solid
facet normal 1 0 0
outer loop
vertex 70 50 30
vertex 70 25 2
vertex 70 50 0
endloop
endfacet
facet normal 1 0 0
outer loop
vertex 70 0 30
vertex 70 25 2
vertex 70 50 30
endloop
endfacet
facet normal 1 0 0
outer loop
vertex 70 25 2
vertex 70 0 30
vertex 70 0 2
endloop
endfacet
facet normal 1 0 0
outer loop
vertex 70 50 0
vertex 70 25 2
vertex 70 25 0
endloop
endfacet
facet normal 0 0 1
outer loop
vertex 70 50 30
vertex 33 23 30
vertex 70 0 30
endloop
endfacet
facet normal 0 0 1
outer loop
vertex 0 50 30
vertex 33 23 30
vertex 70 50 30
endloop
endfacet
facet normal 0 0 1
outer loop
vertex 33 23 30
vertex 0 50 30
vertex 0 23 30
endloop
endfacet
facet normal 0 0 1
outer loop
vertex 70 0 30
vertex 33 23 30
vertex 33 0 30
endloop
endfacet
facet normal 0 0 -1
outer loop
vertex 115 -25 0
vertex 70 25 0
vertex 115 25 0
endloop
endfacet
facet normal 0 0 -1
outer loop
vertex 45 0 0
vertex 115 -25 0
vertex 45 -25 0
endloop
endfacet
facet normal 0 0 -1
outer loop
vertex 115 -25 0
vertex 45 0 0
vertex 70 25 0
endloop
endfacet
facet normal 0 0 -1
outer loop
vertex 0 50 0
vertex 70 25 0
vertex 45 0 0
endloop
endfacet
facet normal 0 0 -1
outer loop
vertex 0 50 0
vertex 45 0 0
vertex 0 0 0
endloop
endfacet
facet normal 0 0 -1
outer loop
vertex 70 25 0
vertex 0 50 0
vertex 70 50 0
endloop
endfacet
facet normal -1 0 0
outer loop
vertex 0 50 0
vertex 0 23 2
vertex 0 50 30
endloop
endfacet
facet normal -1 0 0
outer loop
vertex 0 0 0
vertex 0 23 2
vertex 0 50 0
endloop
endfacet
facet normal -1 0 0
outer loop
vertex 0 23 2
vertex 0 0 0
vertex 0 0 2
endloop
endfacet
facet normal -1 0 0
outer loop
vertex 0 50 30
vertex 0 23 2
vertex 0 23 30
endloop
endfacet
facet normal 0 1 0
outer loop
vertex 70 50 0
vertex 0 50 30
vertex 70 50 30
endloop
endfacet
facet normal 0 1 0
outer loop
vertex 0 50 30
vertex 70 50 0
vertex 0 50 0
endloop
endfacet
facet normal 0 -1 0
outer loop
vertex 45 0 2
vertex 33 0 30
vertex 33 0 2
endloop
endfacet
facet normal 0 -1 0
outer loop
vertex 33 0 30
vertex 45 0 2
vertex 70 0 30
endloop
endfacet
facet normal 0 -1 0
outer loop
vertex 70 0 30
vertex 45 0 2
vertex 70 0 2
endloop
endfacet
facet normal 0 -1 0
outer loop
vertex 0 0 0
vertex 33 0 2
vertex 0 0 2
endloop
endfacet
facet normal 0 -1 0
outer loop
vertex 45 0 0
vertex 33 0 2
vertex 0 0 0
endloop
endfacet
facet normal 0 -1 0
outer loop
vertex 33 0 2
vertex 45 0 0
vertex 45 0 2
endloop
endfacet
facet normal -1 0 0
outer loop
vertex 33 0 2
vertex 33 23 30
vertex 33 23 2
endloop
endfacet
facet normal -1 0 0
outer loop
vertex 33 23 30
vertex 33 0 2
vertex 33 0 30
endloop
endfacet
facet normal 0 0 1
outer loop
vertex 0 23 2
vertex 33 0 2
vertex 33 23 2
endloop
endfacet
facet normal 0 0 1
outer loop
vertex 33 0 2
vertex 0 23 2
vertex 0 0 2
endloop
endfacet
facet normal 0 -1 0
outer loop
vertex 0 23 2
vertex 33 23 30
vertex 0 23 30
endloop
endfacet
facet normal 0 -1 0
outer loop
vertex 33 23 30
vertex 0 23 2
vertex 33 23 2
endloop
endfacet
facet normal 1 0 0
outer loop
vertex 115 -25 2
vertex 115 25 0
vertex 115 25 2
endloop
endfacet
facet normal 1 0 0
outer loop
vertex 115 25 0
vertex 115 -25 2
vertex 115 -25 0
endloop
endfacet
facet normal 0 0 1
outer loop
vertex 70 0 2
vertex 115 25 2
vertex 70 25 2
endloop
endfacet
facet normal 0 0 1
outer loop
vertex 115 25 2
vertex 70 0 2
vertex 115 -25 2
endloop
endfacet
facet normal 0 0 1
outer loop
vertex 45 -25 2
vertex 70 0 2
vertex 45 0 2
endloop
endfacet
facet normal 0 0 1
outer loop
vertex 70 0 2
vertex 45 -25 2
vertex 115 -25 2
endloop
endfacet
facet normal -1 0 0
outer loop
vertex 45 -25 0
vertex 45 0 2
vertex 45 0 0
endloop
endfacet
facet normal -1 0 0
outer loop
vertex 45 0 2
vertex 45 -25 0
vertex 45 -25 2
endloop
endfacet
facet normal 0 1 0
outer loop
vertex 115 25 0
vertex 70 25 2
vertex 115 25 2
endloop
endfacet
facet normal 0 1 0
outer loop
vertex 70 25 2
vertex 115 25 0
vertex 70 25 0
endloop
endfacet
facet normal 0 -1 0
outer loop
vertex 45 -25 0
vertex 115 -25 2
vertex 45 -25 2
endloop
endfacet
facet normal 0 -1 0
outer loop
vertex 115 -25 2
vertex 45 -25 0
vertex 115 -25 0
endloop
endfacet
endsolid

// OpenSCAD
// Two-part enclosure for small electronics board (e.g. Arduino-based logger)
// Print orientation: box on the bed (z = 0), lid on top (+Z), side by side in X

// ---------------- Parameters ----------------
box_x      = 70;    // box outer length (X)
box_y      = 50;    // box outer width (Y)
box_z      = 30;    // box outer height (Z)
box_wall   = 2;     // box wall thickness (sides and top)
box_floor  = 2;     // box floor thickness

gap        = 10;    // clear gap between box and lid (in X)

lip_x      = 65.6;  // lip outer length (X)
lip_y      = 45.6;  // lip outer width (Y)
lip_wall   = 1.5;   // lip wall thickness (Z)
lip_h      = 4;     // lip height above plate (Z)

plate_x    = 70;    // plate length (X)
plate_y    = 50;    // plate width (Y)
plate_t    = 2;     // plate thickness (Z)

eps        = 0.5;   // cutter overshoot past faces

$fn = 64;

// ---------------- Derived ----------------
box_inner_x = box_x - 2 * box_wall;   // 66
box_inner_y = box_y - 2 * box_wall;   // 46
lip_x2      = lip_x - 2 * box_wall;   // 61.6  -> clearance in X = 0.2
lip_y2      = lip_y - 2 * box_wall;   // 41.6  -> clearance in Y = 0.2

// ---------------- Model ----------------
union() {
    // Part 1: Box, open top
    difference() {
        cube([box_x, box_y, box_z]);
        translate([-box_inner_x / 2, -box_inner_y / 2, box_floor])
            cube([box_inner_x, box_inner_y, box_z - box_floor + eps]);
    }

    // Part 2: Lid, printed upside down (lip on top)
    translate([box_x + gap, 0, 0]) {
        union() {
            // Base plate
            translate([-plate_x / 2, -plate_y / 2, 0])
                cube([plate_x, plate_y, plate_t]);

            // Rectangular lip on top of plate
            translate([-lip_x2 / 2, -lip_y2 / 2, plate_t - lip_wall])
                cube([lip_x, lip_y, lip_wall]);
        }
    }
}
